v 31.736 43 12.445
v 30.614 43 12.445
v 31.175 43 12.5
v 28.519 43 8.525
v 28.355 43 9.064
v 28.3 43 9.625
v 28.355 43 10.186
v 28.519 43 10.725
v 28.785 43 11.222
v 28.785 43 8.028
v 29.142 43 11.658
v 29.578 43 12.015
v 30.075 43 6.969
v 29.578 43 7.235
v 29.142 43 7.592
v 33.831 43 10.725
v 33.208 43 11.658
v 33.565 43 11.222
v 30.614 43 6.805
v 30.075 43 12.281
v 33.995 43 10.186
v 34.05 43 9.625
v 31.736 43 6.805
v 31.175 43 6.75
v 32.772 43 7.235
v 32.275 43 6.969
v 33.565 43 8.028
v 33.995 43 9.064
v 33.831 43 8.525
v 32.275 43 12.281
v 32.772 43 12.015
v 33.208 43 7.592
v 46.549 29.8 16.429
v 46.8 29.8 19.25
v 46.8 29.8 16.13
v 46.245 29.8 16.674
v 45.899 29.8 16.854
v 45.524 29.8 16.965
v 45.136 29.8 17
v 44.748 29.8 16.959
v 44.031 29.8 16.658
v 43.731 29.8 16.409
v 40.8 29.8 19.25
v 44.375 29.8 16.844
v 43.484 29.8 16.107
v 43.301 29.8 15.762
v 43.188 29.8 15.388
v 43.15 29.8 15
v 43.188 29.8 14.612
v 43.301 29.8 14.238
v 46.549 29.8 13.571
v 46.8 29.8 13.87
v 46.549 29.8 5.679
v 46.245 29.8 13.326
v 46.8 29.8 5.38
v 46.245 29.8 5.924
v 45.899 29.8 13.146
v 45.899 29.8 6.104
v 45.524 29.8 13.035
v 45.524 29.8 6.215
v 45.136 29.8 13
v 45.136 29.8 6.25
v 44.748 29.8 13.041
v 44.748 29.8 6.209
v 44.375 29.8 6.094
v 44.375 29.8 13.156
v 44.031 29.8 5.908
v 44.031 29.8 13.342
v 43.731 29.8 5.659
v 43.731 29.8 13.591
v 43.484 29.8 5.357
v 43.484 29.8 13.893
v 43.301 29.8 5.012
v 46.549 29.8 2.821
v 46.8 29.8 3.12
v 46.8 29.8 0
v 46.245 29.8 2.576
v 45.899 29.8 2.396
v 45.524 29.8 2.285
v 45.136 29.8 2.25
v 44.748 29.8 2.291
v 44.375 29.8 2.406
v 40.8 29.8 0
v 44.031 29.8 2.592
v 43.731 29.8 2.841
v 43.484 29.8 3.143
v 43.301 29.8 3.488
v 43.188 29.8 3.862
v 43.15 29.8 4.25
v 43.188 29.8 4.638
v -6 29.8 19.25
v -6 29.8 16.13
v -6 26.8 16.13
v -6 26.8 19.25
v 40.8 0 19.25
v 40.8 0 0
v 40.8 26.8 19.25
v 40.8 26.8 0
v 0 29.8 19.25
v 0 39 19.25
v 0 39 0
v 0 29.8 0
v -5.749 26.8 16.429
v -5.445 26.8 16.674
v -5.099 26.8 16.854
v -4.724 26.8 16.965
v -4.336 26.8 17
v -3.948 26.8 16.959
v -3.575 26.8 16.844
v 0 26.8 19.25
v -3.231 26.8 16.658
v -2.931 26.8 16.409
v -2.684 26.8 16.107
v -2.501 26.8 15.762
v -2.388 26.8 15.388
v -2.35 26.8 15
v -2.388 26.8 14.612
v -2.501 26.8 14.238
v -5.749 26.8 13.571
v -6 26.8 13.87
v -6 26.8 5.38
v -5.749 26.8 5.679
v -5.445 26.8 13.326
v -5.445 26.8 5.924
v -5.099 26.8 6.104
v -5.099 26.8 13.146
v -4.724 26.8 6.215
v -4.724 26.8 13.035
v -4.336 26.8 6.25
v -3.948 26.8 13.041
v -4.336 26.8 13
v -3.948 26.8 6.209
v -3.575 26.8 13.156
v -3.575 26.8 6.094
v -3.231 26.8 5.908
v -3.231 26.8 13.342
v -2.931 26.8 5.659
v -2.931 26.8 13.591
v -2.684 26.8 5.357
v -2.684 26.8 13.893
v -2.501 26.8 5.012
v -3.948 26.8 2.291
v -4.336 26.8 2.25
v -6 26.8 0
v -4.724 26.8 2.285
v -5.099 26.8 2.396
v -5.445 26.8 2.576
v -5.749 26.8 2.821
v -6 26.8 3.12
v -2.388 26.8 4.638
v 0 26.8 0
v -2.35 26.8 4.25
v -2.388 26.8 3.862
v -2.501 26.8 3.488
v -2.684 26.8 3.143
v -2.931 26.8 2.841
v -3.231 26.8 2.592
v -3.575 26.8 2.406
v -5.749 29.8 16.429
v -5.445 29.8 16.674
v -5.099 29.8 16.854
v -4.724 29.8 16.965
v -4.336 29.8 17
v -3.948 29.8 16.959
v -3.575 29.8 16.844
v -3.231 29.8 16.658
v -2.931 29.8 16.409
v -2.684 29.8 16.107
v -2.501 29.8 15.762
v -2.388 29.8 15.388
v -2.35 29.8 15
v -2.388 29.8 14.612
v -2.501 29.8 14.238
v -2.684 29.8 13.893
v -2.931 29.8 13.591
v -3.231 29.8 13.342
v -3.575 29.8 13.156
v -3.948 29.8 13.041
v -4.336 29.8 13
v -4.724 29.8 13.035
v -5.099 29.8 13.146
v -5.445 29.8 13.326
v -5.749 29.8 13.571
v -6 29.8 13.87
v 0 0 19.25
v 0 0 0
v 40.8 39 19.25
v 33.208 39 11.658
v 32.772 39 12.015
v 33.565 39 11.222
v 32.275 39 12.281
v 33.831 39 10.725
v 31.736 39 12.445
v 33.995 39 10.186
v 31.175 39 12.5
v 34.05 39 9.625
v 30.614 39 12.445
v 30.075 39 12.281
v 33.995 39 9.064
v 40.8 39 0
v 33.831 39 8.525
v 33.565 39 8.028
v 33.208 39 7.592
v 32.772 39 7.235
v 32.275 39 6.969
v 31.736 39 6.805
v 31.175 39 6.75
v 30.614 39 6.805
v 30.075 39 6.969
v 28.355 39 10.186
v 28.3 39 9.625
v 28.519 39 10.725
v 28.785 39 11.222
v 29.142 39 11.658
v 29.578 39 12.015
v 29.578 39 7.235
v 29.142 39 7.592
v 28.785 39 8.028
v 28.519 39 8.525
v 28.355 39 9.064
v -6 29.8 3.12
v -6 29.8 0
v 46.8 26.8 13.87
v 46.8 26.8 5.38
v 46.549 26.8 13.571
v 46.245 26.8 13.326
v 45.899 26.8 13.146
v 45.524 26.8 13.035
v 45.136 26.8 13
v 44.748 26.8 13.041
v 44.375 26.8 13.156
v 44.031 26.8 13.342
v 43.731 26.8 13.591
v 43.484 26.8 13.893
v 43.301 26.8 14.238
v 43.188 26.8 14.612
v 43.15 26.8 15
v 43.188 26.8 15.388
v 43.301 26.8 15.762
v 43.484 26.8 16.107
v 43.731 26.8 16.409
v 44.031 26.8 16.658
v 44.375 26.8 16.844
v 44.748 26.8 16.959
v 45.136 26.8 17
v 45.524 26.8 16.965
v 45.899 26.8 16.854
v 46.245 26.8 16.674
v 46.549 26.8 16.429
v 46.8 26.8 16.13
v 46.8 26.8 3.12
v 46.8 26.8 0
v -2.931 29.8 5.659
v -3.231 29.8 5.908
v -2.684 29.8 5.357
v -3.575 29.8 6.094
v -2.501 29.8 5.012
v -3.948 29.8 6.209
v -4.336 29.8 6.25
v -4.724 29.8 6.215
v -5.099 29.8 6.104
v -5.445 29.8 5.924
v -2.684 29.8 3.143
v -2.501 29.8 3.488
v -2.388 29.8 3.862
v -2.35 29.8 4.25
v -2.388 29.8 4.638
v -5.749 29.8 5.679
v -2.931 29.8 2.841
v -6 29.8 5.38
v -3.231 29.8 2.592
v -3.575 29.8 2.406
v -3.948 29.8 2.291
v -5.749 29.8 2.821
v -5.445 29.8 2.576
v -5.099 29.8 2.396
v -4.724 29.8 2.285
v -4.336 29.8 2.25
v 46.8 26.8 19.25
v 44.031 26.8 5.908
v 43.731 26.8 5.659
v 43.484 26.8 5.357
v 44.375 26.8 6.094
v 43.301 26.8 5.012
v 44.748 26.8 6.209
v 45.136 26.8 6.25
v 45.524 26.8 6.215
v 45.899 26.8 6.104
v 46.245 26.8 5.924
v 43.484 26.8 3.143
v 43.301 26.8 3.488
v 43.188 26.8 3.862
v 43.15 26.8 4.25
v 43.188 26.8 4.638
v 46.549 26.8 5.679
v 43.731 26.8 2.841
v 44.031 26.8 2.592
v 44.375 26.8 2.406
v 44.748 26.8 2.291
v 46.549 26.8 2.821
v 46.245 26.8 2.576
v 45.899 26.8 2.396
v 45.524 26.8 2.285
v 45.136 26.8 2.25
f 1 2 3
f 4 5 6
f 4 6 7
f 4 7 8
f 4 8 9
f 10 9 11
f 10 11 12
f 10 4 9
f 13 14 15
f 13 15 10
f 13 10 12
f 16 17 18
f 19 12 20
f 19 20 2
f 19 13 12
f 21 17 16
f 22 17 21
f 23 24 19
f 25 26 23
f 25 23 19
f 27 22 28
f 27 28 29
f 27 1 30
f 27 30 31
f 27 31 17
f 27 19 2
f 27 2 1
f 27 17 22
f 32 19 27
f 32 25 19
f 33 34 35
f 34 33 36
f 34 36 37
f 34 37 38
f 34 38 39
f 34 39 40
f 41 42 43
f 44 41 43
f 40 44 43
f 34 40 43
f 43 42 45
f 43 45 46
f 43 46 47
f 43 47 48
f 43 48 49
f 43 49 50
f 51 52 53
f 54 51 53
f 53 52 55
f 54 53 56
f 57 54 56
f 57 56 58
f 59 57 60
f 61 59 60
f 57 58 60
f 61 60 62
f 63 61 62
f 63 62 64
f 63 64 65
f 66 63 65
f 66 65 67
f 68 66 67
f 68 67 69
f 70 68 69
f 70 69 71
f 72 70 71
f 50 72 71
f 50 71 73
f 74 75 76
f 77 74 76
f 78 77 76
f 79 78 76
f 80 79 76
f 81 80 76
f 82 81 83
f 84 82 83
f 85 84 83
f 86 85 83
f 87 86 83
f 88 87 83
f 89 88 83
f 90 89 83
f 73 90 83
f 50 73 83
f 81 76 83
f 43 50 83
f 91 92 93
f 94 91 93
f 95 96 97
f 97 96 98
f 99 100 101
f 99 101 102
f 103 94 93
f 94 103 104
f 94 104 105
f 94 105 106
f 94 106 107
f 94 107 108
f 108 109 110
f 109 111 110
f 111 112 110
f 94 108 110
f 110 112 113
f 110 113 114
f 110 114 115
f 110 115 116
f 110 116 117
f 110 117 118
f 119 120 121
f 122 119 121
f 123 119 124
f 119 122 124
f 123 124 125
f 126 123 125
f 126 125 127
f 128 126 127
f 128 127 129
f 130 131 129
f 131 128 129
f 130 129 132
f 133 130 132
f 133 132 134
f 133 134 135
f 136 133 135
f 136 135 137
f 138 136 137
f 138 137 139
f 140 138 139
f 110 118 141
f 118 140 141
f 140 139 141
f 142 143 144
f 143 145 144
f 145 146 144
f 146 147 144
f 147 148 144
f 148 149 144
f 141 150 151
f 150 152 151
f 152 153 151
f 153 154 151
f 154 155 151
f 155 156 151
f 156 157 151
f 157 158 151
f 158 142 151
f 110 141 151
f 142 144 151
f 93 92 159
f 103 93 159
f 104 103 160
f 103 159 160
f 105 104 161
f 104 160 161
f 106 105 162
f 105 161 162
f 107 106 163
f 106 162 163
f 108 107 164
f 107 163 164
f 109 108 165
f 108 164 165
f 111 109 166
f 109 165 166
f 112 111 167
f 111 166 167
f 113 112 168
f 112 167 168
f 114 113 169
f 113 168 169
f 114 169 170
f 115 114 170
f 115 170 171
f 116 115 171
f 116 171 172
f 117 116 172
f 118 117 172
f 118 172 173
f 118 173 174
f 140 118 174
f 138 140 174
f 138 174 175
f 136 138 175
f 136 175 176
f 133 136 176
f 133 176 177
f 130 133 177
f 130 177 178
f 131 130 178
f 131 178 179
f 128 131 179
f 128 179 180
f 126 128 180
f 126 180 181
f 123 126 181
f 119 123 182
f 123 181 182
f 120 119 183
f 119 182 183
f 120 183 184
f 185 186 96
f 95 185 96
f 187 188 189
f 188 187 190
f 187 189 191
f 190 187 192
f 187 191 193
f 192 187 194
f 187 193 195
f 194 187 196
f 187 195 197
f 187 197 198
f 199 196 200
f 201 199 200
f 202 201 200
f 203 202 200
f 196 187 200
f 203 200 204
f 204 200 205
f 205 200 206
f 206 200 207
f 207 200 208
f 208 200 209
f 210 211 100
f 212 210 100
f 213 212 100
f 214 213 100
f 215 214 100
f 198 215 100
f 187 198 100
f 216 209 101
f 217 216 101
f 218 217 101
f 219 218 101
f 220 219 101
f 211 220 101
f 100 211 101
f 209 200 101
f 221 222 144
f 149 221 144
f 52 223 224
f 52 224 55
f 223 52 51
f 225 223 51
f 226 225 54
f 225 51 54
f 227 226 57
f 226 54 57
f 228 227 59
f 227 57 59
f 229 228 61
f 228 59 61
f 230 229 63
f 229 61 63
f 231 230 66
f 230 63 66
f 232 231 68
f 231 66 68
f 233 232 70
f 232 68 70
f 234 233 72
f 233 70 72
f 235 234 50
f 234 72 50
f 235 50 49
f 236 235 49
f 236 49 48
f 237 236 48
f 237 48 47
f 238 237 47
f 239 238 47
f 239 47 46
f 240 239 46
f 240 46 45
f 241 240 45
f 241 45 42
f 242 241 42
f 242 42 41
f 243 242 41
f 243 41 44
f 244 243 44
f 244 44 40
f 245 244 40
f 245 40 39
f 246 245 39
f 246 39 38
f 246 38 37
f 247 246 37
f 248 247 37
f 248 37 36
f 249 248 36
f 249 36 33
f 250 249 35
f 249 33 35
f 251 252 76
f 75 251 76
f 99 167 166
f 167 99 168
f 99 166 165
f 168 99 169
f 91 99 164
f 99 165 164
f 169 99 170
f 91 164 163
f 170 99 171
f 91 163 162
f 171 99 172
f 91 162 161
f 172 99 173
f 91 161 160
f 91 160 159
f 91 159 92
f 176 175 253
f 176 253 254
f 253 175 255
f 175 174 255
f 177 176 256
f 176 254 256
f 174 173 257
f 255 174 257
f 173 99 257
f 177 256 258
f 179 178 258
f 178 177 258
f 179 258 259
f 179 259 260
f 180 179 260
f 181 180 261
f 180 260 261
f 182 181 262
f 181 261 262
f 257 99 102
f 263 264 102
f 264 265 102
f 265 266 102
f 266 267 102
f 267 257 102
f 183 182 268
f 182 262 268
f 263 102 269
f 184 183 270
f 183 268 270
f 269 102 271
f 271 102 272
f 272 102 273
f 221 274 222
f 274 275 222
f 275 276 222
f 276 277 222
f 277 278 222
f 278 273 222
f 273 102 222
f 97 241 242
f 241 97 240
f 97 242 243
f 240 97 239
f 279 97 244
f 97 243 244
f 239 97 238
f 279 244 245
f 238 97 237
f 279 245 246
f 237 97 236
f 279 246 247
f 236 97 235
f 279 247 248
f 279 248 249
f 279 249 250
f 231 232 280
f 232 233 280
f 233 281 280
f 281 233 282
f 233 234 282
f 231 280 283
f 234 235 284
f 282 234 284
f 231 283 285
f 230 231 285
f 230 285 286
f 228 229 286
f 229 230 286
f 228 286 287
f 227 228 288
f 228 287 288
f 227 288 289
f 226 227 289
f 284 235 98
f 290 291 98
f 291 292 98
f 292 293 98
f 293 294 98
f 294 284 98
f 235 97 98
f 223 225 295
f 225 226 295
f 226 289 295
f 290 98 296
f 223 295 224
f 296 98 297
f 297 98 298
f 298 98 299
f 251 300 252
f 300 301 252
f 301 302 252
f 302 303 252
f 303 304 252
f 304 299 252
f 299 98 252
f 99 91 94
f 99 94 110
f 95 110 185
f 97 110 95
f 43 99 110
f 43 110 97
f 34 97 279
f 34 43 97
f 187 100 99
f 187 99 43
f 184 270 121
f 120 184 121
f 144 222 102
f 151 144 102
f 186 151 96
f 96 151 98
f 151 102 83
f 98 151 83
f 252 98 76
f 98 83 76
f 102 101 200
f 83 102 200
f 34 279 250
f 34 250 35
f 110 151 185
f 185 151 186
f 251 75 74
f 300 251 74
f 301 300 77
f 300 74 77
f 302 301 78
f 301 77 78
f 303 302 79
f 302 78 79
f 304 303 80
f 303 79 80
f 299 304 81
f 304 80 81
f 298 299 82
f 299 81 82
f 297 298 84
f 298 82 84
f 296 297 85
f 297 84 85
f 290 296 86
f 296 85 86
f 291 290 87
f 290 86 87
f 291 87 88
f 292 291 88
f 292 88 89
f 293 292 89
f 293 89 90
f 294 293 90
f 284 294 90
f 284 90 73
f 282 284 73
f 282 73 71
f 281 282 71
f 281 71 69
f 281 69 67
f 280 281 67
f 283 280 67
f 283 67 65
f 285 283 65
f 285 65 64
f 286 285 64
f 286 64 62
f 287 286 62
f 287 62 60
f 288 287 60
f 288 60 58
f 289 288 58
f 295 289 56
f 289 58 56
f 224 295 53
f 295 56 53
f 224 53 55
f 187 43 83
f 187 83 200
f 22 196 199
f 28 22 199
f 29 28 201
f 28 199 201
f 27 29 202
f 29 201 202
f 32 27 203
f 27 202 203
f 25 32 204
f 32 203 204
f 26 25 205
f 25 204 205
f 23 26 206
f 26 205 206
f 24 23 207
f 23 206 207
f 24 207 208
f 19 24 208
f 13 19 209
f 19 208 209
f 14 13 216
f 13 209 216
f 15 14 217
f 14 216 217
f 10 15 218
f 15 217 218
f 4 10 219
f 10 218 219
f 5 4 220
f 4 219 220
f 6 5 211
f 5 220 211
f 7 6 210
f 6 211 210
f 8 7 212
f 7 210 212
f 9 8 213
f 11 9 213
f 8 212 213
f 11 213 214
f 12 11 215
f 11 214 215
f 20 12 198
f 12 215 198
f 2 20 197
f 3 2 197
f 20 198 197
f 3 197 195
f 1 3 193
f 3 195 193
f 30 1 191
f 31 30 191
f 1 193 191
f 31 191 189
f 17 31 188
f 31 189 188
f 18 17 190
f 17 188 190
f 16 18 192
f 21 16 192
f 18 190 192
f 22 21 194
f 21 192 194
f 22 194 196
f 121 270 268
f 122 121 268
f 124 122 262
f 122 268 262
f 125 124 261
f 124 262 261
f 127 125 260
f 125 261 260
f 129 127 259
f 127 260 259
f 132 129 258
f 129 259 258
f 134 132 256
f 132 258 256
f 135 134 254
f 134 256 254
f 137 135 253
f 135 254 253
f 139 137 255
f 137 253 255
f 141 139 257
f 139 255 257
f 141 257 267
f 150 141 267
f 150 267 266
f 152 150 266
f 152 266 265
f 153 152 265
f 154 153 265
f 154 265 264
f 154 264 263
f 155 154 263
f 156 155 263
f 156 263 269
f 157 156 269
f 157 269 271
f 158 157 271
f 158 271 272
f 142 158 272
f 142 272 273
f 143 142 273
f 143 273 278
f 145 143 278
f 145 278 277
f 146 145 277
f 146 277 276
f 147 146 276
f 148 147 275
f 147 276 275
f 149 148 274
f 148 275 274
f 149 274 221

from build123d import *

# Parameters (mm, degrees)
BOSS_EXTRUDE1_DEPTH = 19.25
SKETCH2_R           = 2.875
BOSS_EXTRUDE2_DEPTH = 4
CUT_EXTRUDE1_REACH  = 60.727
SKETCH3_R           = 2


with BuildPart() as part:
    # Sketch1 → Boss-Extrude1 (new body)
    with BuildSketch(Plane.XY):
        Polygon((0, 0), (40.8, 0), (40.8, 26.8), (46.8, 26.8), (46.8, 29.8), (40.8, 29.8), (40.8, 39), (0, 39), (0, 29.8), (-6, 29.8), (-6, 26.8), (0, 26.8), align=None)
    extrude(amount=BOSS_EXTRUDE1_DEPTH)

    # Sketch2 → Boss-Extrude2 (add)
    with BuildSketch(Plane(origin=(0, 39, 0), x_dir=(1, 0, 0), z_dir=(0, 1, 0))):
        with Locations((31.175, -9.625)):
            Circle(SKETCH2_R)
    extrude(amount=BOSS_EXTRUDE2_DEPTH)

    # Sketch3 → Cut-Extrude1 (cut, up to next)
    with BuildSketch(Plane(origin=(0, 29.8, 0), x_dir=(1, 0, 0), z_dir=(0, 1, 0)), mode=Mode.PRIVATE) as cut_extrude1_sk1:
        with Locations((45.15, -15)):
            Circle(SKETCH3_R)
    cut_extrude1_tool1 = extrude(cut_extrude1_sk1.sketch, amount=-CUT_EXTRUDE1_REACH, mode=Mode.PRIVATE) & part.part
    # Sketch3 → Cut-Extrude1 (cut, up to next)
    with BuildSketch(Plane(origin=(0, 29.8, 0), x_dir=(1, 0, 0), z_dir=(0, 1, 0)), mode=Mode.PRIVATE) as cut_extrude1_sk2:
        with Locations((45.15, -4.25)):
            Circle(SKETCH3_R)
    cut_extrude1_tool2 = extrude(cut_extrude1_sk2.sketch, amount=-CUT_EXTRUDE1_REACH, mode=Mode.PRIVATE) & part.part
    # Sketch3 → Cut-Extrude1 (cut, up to next)
    with BuildSketch(Plane(origin=(0, 29.8, 0), x_dir=(1, 0, 0), z_dir=(0, 1, 0)), mode=Mode.PRIVATE) as cut_extrude1_sk3:
        with Locations((-4.35, -4.25)):
            Circle(SKETCH3_R)
    cut_extrude1_tool3 = extrude(cut_extrude1_sk3.sketch, amount=-CUT_EXTRUDE1_REACH, mode=Mode.PRIVATE) & part.part
    # Sketch3 → Cut-Extrude1 (cut, up to next)
    with BuildSketch(Plane(origin=(0, 29.8, 0), x_dir=(1, 0, 0), z_dir=(0, 1, 0)), mode=Mode.PRIVATE) as cut_extrude1_sk4:
        with Locations((-4.35, -15)):
            Circle(SKETCH3_R)
    cut_extrude1_tool4 = extrude(cut_extrude1_sk4.sketch, amount=-CUT_EXTRUDE1_REACH, mode=Mode.PRIVATE) & part.part
    add(cut_extrude1_tool1.solids().sort_by_distance((45.15, 29.8, 15))[0], mode=Mode.SUBTRACT)
    add(cut_extrude1_tool2.solids().sort_by_distance((45.15, 29.8, 4.25))[0], mode=Mode.SUBTRACT)
    add(cut_extrude1_tool3.solids().sort_by_distance((-4.35, 29.8, 4.25))[0], mode=Mode.SUBTRACT)
    add(cut_extrude1_tool4.solids().sort_by_distance((-4.35, 29.8, 15))[0], mode=Mode.SUBTRACT)


solid = part.part
